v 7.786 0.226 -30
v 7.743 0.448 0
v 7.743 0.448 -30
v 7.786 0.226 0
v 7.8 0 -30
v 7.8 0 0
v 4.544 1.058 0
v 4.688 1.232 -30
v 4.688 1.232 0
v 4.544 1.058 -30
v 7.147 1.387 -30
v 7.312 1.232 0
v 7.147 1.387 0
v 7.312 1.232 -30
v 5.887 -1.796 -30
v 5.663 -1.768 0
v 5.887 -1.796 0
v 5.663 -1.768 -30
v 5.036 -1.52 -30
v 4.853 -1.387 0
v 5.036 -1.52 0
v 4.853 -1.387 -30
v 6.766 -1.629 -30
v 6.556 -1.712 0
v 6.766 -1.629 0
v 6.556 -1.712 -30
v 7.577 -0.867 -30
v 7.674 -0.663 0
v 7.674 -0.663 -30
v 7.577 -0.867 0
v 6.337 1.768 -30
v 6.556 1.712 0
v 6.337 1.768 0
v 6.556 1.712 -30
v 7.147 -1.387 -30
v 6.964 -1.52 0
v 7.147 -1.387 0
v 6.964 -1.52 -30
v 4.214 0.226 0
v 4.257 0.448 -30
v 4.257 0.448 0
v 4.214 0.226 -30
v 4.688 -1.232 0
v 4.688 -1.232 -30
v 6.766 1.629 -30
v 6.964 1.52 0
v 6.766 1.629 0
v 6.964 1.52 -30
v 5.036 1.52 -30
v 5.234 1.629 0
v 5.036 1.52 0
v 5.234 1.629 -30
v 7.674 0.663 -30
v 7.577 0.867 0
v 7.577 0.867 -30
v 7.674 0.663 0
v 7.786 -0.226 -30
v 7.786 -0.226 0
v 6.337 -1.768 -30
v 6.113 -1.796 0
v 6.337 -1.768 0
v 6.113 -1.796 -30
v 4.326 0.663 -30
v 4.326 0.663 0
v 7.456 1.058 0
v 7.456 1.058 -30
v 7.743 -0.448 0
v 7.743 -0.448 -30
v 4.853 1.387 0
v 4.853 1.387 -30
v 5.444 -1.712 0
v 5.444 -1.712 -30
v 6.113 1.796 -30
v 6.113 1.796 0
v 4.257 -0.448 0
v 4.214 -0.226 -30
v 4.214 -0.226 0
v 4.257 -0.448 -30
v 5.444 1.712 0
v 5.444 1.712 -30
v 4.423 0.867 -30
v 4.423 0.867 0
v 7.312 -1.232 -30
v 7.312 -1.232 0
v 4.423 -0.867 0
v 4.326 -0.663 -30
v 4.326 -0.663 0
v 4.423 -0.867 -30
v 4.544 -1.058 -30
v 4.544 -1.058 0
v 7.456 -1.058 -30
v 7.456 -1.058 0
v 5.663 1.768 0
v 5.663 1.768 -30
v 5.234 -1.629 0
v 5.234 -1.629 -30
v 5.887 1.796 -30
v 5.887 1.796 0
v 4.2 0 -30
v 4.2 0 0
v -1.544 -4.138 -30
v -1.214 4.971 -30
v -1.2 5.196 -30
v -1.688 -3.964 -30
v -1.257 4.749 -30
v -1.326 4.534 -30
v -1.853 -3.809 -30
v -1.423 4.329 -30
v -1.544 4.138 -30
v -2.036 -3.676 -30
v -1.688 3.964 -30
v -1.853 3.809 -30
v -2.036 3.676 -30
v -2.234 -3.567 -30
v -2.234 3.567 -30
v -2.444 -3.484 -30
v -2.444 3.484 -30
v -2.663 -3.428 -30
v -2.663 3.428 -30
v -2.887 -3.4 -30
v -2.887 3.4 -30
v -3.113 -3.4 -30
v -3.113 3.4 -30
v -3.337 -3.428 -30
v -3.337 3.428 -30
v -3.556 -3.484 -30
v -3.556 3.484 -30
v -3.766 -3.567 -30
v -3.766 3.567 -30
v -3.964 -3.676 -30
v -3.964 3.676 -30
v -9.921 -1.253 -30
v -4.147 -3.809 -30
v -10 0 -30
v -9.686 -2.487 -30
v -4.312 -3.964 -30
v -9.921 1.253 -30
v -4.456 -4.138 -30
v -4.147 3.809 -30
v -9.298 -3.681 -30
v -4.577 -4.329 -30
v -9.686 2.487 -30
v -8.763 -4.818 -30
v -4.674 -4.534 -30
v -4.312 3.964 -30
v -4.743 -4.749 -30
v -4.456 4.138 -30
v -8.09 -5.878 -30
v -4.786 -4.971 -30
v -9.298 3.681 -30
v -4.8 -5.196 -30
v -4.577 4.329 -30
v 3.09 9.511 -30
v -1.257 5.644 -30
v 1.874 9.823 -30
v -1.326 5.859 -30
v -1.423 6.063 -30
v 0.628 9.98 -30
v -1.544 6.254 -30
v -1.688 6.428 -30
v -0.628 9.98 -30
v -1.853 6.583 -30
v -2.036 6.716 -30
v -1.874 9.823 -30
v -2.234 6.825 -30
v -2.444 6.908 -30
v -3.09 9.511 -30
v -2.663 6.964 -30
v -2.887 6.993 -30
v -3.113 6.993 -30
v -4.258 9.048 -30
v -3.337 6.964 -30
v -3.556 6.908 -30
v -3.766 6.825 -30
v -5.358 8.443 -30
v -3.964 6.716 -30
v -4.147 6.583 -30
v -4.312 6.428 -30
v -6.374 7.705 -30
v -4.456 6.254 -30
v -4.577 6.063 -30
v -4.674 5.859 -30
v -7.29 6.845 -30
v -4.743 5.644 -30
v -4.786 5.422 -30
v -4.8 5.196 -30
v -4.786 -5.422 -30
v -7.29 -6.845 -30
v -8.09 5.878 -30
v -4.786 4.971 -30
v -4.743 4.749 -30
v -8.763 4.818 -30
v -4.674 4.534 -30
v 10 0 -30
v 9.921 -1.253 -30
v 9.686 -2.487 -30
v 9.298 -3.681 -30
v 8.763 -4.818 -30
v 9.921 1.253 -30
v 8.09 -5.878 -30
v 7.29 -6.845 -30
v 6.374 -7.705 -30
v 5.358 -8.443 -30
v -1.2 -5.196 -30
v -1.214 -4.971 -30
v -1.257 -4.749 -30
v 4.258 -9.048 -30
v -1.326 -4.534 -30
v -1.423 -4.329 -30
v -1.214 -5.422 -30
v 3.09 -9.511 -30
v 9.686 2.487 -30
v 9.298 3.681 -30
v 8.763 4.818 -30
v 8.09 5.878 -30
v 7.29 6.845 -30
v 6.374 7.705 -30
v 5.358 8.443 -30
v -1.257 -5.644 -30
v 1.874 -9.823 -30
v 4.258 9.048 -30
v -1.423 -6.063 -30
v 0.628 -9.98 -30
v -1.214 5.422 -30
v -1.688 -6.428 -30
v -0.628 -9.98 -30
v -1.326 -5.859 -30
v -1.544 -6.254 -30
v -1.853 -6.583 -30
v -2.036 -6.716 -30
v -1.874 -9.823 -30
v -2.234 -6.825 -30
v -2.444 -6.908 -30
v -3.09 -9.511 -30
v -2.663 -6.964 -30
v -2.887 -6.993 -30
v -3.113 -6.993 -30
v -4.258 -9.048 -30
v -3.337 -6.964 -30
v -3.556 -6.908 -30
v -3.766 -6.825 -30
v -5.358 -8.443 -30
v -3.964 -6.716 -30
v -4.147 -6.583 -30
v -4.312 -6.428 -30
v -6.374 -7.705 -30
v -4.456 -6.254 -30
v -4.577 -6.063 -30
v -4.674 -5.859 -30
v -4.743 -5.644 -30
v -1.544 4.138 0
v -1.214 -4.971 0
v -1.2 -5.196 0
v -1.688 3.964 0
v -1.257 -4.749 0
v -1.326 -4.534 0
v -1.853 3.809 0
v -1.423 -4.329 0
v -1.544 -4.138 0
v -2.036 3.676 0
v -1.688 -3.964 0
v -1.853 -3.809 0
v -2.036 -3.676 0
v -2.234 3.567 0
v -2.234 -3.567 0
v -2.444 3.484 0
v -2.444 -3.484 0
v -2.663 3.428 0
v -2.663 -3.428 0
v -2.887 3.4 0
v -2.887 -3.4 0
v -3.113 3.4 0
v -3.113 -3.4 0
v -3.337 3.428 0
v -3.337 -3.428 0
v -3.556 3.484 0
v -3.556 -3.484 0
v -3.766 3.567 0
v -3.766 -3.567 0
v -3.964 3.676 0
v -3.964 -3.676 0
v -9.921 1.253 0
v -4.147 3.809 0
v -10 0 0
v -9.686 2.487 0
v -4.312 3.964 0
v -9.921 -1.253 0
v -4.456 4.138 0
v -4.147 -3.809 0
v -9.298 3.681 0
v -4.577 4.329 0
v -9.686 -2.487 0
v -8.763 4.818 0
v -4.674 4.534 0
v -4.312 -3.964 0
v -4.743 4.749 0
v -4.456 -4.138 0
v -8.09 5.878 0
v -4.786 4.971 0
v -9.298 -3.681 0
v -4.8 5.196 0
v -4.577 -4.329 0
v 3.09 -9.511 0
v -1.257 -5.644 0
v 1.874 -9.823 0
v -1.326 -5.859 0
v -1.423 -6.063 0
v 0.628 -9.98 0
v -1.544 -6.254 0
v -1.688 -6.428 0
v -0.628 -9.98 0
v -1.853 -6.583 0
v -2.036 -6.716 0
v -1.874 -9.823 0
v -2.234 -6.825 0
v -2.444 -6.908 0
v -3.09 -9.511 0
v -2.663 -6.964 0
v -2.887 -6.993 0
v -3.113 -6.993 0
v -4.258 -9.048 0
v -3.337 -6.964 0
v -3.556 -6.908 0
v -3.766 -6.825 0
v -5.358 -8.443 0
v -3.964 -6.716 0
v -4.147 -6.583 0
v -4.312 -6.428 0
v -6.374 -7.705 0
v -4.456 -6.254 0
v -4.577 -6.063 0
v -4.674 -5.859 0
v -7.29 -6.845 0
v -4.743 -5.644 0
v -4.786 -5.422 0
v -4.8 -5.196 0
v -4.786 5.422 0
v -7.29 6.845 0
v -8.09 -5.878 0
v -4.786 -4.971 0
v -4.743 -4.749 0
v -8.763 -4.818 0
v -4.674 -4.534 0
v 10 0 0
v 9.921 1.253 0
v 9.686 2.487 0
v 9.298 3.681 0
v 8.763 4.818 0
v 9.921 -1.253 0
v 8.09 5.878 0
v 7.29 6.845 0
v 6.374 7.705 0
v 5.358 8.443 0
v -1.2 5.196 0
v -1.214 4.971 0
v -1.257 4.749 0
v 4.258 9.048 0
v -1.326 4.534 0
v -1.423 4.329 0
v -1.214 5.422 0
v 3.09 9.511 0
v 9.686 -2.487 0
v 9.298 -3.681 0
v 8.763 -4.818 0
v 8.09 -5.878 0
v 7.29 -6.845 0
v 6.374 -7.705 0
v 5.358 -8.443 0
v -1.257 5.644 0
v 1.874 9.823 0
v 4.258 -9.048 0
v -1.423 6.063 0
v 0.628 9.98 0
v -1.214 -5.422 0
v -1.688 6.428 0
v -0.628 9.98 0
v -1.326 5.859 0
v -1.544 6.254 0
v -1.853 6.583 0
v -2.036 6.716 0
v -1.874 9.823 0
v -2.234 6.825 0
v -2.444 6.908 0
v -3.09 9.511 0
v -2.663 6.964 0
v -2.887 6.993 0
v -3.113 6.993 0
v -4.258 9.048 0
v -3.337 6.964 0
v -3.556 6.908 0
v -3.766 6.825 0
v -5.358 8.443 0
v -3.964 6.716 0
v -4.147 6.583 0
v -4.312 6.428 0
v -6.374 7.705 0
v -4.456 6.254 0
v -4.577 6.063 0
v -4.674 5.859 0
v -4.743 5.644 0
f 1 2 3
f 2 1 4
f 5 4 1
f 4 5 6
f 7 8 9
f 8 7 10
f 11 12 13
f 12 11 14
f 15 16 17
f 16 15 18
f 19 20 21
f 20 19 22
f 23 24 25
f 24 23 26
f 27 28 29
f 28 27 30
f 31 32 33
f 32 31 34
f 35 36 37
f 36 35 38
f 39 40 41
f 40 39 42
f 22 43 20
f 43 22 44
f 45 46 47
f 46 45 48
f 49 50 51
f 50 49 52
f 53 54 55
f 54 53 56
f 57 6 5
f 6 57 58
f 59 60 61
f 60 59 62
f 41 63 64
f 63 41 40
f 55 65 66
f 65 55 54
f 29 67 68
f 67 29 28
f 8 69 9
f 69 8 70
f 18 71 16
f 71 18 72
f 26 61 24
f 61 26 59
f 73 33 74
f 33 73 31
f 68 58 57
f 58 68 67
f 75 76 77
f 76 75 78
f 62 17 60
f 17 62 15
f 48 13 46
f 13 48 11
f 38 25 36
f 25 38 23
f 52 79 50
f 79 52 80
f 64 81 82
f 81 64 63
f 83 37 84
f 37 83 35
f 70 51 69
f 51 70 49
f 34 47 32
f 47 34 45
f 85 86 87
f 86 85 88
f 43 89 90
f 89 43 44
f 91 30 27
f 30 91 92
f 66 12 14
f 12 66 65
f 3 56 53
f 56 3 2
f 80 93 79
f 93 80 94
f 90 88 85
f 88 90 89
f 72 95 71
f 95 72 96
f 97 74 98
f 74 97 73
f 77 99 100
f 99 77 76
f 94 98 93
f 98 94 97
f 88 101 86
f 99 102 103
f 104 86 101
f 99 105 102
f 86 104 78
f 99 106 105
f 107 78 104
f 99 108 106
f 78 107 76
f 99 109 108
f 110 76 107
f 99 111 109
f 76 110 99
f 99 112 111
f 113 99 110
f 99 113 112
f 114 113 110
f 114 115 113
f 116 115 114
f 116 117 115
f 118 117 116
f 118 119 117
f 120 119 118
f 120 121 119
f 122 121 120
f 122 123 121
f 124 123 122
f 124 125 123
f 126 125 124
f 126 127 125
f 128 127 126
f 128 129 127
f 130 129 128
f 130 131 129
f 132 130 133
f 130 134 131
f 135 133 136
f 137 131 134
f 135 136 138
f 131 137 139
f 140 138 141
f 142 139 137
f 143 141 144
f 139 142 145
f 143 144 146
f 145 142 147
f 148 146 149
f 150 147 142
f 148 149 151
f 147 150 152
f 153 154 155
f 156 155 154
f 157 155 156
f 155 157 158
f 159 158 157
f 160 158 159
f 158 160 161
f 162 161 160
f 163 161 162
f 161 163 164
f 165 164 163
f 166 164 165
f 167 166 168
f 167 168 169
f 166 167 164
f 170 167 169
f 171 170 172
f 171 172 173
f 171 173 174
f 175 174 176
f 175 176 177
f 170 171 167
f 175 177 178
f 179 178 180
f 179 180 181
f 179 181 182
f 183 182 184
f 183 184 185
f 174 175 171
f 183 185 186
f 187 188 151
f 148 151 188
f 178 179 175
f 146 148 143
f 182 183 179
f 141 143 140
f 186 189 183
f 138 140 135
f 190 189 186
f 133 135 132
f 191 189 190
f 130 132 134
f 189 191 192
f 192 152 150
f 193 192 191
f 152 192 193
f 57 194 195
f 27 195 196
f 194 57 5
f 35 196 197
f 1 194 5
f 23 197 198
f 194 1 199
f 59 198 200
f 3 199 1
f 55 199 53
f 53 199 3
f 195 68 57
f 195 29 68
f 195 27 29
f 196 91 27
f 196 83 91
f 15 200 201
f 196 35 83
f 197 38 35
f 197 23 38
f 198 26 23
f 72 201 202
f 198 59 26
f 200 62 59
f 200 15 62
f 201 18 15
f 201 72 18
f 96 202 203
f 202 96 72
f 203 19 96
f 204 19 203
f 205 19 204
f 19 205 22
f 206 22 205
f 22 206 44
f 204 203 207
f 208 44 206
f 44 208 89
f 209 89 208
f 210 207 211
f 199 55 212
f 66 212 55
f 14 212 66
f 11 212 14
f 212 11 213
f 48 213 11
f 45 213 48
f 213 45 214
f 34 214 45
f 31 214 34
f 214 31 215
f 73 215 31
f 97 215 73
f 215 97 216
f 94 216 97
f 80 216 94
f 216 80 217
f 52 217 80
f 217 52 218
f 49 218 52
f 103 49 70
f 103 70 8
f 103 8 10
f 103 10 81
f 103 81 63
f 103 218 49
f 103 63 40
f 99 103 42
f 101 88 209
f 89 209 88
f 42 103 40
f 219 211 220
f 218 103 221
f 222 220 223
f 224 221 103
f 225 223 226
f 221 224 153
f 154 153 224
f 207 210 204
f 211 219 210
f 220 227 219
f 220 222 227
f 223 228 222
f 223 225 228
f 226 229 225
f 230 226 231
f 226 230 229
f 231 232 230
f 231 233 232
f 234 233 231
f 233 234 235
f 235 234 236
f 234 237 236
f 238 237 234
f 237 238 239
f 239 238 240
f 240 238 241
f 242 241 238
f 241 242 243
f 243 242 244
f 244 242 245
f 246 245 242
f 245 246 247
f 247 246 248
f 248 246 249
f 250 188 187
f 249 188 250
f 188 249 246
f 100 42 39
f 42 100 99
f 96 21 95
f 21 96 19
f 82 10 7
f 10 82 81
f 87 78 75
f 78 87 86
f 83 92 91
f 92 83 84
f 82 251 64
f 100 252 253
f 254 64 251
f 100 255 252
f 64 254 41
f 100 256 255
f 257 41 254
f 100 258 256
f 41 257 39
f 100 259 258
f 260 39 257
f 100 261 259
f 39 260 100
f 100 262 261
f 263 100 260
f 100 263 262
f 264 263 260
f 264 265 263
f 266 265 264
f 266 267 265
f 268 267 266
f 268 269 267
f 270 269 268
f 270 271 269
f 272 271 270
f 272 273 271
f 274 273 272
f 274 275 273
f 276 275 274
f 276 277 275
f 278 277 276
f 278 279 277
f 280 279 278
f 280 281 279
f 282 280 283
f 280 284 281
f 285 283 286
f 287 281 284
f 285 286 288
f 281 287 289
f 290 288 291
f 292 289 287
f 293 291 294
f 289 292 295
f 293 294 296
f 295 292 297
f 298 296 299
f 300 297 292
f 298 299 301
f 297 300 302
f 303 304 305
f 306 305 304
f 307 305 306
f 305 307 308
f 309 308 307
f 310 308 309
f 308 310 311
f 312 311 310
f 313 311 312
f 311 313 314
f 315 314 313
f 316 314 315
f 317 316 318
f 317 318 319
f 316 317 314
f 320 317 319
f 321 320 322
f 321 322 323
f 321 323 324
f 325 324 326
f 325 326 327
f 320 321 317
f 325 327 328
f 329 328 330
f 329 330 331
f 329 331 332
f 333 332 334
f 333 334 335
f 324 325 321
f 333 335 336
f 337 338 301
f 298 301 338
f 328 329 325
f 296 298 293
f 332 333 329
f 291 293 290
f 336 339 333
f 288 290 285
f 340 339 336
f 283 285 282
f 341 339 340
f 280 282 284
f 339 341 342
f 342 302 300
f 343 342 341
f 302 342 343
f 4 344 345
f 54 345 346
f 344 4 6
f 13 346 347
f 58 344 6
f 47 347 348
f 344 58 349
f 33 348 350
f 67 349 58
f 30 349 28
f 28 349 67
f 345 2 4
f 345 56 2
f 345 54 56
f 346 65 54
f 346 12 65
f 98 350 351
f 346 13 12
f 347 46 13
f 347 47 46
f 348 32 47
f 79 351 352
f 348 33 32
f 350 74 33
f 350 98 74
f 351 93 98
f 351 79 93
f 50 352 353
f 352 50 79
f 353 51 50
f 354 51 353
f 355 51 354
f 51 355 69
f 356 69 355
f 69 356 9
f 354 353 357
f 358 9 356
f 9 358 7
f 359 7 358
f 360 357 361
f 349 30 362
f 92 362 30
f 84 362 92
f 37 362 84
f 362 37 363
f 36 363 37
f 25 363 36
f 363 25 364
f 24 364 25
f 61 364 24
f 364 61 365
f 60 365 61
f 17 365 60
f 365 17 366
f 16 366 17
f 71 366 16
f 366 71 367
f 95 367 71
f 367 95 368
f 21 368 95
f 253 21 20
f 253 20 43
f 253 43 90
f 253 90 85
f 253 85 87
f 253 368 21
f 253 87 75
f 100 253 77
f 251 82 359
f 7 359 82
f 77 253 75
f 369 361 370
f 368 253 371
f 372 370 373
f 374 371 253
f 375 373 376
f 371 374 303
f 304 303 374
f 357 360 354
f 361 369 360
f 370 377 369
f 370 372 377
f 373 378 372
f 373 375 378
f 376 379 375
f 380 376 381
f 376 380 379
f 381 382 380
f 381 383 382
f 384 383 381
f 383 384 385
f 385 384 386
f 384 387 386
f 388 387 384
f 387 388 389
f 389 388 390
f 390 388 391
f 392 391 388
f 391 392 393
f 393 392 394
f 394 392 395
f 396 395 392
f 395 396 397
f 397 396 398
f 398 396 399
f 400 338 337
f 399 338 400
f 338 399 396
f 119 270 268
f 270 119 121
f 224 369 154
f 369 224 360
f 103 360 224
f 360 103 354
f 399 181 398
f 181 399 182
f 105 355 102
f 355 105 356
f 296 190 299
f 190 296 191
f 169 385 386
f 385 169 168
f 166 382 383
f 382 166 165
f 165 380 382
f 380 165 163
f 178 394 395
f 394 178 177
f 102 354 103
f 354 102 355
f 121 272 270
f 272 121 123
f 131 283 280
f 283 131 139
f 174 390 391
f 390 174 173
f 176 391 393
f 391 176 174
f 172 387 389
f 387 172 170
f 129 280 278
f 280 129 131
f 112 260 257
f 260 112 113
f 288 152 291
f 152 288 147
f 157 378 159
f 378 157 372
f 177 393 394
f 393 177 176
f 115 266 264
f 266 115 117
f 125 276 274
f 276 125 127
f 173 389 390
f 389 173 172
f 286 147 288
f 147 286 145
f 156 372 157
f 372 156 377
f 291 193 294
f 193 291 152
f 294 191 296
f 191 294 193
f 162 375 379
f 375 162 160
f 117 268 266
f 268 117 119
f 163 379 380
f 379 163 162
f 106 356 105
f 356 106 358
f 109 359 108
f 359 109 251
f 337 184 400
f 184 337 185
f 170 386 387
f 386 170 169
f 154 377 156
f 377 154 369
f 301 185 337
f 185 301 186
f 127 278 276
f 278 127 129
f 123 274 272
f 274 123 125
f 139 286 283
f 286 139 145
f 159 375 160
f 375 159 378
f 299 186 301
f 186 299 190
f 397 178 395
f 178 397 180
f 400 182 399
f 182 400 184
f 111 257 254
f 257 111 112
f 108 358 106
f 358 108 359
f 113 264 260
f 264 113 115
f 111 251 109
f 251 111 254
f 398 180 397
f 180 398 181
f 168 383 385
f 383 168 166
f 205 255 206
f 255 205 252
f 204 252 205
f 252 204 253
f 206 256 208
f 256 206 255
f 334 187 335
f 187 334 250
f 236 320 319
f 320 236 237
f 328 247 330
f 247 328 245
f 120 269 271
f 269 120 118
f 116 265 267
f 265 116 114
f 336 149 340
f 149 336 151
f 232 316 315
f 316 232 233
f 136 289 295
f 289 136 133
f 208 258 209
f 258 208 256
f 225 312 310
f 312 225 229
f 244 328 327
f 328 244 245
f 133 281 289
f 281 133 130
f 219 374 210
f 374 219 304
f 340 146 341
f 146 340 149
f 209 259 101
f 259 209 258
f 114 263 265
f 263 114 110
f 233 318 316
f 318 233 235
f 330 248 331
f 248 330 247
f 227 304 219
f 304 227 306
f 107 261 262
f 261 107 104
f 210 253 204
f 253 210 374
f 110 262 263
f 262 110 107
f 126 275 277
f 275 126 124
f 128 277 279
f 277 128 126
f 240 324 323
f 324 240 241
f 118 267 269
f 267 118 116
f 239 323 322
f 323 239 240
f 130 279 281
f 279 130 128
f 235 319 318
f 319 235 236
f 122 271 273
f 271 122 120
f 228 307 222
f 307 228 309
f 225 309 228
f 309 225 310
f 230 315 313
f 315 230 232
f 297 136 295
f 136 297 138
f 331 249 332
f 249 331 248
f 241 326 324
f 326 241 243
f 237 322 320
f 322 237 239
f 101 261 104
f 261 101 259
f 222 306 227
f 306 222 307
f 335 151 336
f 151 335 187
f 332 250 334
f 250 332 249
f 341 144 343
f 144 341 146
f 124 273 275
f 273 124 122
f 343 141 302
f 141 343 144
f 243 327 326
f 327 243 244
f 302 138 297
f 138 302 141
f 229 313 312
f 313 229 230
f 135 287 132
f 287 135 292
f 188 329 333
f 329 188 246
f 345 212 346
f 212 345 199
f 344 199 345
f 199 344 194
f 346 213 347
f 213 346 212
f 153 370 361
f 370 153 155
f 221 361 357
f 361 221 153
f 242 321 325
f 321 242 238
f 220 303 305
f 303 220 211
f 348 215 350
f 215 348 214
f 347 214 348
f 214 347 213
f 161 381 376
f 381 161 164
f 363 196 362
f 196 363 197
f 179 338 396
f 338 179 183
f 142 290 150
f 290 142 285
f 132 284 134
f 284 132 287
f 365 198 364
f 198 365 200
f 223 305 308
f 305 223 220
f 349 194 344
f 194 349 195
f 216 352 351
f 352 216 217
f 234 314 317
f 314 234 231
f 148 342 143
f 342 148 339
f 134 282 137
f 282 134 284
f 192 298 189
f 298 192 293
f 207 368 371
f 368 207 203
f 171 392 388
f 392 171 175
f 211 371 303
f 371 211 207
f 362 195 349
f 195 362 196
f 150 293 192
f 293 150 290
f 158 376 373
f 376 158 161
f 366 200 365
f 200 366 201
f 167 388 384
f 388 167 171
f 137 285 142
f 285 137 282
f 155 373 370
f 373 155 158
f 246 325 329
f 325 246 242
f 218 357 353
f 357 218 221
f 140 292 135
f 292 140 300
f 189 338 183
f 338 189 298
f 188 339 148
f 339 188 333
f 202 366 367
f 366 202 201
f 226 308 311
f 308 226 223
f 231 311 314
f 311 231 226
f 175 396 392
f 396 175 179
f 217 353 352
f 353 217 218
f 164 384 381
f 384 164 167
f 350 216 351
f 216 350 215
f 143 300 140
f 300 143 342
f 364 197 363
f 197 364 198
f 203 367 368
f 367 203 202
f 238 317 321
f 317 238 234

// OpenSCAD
$fn = 50;


difference() {
	union() {
		translate(v = [0, 0, -30.0000000000]) {
			cylinder(h = 30, r = 10.0000000000);
		}
	}
	union() {
		#translate(v = [6.0000000000, 0.0000000000, -30]) {
			cylinder(h = 30, r = 1.8000000000);
		}
		#translate(v = [-3.0000000000, 5.1961524227, -30]) {
			cylinder(h = 30, r = 1.8000000000);
		}
		#translate(v = [-3.0000000000, -5.1961524227, -30]) {
			cylinder(h = 30, r = 1.8000000000);
		}
	}
}
